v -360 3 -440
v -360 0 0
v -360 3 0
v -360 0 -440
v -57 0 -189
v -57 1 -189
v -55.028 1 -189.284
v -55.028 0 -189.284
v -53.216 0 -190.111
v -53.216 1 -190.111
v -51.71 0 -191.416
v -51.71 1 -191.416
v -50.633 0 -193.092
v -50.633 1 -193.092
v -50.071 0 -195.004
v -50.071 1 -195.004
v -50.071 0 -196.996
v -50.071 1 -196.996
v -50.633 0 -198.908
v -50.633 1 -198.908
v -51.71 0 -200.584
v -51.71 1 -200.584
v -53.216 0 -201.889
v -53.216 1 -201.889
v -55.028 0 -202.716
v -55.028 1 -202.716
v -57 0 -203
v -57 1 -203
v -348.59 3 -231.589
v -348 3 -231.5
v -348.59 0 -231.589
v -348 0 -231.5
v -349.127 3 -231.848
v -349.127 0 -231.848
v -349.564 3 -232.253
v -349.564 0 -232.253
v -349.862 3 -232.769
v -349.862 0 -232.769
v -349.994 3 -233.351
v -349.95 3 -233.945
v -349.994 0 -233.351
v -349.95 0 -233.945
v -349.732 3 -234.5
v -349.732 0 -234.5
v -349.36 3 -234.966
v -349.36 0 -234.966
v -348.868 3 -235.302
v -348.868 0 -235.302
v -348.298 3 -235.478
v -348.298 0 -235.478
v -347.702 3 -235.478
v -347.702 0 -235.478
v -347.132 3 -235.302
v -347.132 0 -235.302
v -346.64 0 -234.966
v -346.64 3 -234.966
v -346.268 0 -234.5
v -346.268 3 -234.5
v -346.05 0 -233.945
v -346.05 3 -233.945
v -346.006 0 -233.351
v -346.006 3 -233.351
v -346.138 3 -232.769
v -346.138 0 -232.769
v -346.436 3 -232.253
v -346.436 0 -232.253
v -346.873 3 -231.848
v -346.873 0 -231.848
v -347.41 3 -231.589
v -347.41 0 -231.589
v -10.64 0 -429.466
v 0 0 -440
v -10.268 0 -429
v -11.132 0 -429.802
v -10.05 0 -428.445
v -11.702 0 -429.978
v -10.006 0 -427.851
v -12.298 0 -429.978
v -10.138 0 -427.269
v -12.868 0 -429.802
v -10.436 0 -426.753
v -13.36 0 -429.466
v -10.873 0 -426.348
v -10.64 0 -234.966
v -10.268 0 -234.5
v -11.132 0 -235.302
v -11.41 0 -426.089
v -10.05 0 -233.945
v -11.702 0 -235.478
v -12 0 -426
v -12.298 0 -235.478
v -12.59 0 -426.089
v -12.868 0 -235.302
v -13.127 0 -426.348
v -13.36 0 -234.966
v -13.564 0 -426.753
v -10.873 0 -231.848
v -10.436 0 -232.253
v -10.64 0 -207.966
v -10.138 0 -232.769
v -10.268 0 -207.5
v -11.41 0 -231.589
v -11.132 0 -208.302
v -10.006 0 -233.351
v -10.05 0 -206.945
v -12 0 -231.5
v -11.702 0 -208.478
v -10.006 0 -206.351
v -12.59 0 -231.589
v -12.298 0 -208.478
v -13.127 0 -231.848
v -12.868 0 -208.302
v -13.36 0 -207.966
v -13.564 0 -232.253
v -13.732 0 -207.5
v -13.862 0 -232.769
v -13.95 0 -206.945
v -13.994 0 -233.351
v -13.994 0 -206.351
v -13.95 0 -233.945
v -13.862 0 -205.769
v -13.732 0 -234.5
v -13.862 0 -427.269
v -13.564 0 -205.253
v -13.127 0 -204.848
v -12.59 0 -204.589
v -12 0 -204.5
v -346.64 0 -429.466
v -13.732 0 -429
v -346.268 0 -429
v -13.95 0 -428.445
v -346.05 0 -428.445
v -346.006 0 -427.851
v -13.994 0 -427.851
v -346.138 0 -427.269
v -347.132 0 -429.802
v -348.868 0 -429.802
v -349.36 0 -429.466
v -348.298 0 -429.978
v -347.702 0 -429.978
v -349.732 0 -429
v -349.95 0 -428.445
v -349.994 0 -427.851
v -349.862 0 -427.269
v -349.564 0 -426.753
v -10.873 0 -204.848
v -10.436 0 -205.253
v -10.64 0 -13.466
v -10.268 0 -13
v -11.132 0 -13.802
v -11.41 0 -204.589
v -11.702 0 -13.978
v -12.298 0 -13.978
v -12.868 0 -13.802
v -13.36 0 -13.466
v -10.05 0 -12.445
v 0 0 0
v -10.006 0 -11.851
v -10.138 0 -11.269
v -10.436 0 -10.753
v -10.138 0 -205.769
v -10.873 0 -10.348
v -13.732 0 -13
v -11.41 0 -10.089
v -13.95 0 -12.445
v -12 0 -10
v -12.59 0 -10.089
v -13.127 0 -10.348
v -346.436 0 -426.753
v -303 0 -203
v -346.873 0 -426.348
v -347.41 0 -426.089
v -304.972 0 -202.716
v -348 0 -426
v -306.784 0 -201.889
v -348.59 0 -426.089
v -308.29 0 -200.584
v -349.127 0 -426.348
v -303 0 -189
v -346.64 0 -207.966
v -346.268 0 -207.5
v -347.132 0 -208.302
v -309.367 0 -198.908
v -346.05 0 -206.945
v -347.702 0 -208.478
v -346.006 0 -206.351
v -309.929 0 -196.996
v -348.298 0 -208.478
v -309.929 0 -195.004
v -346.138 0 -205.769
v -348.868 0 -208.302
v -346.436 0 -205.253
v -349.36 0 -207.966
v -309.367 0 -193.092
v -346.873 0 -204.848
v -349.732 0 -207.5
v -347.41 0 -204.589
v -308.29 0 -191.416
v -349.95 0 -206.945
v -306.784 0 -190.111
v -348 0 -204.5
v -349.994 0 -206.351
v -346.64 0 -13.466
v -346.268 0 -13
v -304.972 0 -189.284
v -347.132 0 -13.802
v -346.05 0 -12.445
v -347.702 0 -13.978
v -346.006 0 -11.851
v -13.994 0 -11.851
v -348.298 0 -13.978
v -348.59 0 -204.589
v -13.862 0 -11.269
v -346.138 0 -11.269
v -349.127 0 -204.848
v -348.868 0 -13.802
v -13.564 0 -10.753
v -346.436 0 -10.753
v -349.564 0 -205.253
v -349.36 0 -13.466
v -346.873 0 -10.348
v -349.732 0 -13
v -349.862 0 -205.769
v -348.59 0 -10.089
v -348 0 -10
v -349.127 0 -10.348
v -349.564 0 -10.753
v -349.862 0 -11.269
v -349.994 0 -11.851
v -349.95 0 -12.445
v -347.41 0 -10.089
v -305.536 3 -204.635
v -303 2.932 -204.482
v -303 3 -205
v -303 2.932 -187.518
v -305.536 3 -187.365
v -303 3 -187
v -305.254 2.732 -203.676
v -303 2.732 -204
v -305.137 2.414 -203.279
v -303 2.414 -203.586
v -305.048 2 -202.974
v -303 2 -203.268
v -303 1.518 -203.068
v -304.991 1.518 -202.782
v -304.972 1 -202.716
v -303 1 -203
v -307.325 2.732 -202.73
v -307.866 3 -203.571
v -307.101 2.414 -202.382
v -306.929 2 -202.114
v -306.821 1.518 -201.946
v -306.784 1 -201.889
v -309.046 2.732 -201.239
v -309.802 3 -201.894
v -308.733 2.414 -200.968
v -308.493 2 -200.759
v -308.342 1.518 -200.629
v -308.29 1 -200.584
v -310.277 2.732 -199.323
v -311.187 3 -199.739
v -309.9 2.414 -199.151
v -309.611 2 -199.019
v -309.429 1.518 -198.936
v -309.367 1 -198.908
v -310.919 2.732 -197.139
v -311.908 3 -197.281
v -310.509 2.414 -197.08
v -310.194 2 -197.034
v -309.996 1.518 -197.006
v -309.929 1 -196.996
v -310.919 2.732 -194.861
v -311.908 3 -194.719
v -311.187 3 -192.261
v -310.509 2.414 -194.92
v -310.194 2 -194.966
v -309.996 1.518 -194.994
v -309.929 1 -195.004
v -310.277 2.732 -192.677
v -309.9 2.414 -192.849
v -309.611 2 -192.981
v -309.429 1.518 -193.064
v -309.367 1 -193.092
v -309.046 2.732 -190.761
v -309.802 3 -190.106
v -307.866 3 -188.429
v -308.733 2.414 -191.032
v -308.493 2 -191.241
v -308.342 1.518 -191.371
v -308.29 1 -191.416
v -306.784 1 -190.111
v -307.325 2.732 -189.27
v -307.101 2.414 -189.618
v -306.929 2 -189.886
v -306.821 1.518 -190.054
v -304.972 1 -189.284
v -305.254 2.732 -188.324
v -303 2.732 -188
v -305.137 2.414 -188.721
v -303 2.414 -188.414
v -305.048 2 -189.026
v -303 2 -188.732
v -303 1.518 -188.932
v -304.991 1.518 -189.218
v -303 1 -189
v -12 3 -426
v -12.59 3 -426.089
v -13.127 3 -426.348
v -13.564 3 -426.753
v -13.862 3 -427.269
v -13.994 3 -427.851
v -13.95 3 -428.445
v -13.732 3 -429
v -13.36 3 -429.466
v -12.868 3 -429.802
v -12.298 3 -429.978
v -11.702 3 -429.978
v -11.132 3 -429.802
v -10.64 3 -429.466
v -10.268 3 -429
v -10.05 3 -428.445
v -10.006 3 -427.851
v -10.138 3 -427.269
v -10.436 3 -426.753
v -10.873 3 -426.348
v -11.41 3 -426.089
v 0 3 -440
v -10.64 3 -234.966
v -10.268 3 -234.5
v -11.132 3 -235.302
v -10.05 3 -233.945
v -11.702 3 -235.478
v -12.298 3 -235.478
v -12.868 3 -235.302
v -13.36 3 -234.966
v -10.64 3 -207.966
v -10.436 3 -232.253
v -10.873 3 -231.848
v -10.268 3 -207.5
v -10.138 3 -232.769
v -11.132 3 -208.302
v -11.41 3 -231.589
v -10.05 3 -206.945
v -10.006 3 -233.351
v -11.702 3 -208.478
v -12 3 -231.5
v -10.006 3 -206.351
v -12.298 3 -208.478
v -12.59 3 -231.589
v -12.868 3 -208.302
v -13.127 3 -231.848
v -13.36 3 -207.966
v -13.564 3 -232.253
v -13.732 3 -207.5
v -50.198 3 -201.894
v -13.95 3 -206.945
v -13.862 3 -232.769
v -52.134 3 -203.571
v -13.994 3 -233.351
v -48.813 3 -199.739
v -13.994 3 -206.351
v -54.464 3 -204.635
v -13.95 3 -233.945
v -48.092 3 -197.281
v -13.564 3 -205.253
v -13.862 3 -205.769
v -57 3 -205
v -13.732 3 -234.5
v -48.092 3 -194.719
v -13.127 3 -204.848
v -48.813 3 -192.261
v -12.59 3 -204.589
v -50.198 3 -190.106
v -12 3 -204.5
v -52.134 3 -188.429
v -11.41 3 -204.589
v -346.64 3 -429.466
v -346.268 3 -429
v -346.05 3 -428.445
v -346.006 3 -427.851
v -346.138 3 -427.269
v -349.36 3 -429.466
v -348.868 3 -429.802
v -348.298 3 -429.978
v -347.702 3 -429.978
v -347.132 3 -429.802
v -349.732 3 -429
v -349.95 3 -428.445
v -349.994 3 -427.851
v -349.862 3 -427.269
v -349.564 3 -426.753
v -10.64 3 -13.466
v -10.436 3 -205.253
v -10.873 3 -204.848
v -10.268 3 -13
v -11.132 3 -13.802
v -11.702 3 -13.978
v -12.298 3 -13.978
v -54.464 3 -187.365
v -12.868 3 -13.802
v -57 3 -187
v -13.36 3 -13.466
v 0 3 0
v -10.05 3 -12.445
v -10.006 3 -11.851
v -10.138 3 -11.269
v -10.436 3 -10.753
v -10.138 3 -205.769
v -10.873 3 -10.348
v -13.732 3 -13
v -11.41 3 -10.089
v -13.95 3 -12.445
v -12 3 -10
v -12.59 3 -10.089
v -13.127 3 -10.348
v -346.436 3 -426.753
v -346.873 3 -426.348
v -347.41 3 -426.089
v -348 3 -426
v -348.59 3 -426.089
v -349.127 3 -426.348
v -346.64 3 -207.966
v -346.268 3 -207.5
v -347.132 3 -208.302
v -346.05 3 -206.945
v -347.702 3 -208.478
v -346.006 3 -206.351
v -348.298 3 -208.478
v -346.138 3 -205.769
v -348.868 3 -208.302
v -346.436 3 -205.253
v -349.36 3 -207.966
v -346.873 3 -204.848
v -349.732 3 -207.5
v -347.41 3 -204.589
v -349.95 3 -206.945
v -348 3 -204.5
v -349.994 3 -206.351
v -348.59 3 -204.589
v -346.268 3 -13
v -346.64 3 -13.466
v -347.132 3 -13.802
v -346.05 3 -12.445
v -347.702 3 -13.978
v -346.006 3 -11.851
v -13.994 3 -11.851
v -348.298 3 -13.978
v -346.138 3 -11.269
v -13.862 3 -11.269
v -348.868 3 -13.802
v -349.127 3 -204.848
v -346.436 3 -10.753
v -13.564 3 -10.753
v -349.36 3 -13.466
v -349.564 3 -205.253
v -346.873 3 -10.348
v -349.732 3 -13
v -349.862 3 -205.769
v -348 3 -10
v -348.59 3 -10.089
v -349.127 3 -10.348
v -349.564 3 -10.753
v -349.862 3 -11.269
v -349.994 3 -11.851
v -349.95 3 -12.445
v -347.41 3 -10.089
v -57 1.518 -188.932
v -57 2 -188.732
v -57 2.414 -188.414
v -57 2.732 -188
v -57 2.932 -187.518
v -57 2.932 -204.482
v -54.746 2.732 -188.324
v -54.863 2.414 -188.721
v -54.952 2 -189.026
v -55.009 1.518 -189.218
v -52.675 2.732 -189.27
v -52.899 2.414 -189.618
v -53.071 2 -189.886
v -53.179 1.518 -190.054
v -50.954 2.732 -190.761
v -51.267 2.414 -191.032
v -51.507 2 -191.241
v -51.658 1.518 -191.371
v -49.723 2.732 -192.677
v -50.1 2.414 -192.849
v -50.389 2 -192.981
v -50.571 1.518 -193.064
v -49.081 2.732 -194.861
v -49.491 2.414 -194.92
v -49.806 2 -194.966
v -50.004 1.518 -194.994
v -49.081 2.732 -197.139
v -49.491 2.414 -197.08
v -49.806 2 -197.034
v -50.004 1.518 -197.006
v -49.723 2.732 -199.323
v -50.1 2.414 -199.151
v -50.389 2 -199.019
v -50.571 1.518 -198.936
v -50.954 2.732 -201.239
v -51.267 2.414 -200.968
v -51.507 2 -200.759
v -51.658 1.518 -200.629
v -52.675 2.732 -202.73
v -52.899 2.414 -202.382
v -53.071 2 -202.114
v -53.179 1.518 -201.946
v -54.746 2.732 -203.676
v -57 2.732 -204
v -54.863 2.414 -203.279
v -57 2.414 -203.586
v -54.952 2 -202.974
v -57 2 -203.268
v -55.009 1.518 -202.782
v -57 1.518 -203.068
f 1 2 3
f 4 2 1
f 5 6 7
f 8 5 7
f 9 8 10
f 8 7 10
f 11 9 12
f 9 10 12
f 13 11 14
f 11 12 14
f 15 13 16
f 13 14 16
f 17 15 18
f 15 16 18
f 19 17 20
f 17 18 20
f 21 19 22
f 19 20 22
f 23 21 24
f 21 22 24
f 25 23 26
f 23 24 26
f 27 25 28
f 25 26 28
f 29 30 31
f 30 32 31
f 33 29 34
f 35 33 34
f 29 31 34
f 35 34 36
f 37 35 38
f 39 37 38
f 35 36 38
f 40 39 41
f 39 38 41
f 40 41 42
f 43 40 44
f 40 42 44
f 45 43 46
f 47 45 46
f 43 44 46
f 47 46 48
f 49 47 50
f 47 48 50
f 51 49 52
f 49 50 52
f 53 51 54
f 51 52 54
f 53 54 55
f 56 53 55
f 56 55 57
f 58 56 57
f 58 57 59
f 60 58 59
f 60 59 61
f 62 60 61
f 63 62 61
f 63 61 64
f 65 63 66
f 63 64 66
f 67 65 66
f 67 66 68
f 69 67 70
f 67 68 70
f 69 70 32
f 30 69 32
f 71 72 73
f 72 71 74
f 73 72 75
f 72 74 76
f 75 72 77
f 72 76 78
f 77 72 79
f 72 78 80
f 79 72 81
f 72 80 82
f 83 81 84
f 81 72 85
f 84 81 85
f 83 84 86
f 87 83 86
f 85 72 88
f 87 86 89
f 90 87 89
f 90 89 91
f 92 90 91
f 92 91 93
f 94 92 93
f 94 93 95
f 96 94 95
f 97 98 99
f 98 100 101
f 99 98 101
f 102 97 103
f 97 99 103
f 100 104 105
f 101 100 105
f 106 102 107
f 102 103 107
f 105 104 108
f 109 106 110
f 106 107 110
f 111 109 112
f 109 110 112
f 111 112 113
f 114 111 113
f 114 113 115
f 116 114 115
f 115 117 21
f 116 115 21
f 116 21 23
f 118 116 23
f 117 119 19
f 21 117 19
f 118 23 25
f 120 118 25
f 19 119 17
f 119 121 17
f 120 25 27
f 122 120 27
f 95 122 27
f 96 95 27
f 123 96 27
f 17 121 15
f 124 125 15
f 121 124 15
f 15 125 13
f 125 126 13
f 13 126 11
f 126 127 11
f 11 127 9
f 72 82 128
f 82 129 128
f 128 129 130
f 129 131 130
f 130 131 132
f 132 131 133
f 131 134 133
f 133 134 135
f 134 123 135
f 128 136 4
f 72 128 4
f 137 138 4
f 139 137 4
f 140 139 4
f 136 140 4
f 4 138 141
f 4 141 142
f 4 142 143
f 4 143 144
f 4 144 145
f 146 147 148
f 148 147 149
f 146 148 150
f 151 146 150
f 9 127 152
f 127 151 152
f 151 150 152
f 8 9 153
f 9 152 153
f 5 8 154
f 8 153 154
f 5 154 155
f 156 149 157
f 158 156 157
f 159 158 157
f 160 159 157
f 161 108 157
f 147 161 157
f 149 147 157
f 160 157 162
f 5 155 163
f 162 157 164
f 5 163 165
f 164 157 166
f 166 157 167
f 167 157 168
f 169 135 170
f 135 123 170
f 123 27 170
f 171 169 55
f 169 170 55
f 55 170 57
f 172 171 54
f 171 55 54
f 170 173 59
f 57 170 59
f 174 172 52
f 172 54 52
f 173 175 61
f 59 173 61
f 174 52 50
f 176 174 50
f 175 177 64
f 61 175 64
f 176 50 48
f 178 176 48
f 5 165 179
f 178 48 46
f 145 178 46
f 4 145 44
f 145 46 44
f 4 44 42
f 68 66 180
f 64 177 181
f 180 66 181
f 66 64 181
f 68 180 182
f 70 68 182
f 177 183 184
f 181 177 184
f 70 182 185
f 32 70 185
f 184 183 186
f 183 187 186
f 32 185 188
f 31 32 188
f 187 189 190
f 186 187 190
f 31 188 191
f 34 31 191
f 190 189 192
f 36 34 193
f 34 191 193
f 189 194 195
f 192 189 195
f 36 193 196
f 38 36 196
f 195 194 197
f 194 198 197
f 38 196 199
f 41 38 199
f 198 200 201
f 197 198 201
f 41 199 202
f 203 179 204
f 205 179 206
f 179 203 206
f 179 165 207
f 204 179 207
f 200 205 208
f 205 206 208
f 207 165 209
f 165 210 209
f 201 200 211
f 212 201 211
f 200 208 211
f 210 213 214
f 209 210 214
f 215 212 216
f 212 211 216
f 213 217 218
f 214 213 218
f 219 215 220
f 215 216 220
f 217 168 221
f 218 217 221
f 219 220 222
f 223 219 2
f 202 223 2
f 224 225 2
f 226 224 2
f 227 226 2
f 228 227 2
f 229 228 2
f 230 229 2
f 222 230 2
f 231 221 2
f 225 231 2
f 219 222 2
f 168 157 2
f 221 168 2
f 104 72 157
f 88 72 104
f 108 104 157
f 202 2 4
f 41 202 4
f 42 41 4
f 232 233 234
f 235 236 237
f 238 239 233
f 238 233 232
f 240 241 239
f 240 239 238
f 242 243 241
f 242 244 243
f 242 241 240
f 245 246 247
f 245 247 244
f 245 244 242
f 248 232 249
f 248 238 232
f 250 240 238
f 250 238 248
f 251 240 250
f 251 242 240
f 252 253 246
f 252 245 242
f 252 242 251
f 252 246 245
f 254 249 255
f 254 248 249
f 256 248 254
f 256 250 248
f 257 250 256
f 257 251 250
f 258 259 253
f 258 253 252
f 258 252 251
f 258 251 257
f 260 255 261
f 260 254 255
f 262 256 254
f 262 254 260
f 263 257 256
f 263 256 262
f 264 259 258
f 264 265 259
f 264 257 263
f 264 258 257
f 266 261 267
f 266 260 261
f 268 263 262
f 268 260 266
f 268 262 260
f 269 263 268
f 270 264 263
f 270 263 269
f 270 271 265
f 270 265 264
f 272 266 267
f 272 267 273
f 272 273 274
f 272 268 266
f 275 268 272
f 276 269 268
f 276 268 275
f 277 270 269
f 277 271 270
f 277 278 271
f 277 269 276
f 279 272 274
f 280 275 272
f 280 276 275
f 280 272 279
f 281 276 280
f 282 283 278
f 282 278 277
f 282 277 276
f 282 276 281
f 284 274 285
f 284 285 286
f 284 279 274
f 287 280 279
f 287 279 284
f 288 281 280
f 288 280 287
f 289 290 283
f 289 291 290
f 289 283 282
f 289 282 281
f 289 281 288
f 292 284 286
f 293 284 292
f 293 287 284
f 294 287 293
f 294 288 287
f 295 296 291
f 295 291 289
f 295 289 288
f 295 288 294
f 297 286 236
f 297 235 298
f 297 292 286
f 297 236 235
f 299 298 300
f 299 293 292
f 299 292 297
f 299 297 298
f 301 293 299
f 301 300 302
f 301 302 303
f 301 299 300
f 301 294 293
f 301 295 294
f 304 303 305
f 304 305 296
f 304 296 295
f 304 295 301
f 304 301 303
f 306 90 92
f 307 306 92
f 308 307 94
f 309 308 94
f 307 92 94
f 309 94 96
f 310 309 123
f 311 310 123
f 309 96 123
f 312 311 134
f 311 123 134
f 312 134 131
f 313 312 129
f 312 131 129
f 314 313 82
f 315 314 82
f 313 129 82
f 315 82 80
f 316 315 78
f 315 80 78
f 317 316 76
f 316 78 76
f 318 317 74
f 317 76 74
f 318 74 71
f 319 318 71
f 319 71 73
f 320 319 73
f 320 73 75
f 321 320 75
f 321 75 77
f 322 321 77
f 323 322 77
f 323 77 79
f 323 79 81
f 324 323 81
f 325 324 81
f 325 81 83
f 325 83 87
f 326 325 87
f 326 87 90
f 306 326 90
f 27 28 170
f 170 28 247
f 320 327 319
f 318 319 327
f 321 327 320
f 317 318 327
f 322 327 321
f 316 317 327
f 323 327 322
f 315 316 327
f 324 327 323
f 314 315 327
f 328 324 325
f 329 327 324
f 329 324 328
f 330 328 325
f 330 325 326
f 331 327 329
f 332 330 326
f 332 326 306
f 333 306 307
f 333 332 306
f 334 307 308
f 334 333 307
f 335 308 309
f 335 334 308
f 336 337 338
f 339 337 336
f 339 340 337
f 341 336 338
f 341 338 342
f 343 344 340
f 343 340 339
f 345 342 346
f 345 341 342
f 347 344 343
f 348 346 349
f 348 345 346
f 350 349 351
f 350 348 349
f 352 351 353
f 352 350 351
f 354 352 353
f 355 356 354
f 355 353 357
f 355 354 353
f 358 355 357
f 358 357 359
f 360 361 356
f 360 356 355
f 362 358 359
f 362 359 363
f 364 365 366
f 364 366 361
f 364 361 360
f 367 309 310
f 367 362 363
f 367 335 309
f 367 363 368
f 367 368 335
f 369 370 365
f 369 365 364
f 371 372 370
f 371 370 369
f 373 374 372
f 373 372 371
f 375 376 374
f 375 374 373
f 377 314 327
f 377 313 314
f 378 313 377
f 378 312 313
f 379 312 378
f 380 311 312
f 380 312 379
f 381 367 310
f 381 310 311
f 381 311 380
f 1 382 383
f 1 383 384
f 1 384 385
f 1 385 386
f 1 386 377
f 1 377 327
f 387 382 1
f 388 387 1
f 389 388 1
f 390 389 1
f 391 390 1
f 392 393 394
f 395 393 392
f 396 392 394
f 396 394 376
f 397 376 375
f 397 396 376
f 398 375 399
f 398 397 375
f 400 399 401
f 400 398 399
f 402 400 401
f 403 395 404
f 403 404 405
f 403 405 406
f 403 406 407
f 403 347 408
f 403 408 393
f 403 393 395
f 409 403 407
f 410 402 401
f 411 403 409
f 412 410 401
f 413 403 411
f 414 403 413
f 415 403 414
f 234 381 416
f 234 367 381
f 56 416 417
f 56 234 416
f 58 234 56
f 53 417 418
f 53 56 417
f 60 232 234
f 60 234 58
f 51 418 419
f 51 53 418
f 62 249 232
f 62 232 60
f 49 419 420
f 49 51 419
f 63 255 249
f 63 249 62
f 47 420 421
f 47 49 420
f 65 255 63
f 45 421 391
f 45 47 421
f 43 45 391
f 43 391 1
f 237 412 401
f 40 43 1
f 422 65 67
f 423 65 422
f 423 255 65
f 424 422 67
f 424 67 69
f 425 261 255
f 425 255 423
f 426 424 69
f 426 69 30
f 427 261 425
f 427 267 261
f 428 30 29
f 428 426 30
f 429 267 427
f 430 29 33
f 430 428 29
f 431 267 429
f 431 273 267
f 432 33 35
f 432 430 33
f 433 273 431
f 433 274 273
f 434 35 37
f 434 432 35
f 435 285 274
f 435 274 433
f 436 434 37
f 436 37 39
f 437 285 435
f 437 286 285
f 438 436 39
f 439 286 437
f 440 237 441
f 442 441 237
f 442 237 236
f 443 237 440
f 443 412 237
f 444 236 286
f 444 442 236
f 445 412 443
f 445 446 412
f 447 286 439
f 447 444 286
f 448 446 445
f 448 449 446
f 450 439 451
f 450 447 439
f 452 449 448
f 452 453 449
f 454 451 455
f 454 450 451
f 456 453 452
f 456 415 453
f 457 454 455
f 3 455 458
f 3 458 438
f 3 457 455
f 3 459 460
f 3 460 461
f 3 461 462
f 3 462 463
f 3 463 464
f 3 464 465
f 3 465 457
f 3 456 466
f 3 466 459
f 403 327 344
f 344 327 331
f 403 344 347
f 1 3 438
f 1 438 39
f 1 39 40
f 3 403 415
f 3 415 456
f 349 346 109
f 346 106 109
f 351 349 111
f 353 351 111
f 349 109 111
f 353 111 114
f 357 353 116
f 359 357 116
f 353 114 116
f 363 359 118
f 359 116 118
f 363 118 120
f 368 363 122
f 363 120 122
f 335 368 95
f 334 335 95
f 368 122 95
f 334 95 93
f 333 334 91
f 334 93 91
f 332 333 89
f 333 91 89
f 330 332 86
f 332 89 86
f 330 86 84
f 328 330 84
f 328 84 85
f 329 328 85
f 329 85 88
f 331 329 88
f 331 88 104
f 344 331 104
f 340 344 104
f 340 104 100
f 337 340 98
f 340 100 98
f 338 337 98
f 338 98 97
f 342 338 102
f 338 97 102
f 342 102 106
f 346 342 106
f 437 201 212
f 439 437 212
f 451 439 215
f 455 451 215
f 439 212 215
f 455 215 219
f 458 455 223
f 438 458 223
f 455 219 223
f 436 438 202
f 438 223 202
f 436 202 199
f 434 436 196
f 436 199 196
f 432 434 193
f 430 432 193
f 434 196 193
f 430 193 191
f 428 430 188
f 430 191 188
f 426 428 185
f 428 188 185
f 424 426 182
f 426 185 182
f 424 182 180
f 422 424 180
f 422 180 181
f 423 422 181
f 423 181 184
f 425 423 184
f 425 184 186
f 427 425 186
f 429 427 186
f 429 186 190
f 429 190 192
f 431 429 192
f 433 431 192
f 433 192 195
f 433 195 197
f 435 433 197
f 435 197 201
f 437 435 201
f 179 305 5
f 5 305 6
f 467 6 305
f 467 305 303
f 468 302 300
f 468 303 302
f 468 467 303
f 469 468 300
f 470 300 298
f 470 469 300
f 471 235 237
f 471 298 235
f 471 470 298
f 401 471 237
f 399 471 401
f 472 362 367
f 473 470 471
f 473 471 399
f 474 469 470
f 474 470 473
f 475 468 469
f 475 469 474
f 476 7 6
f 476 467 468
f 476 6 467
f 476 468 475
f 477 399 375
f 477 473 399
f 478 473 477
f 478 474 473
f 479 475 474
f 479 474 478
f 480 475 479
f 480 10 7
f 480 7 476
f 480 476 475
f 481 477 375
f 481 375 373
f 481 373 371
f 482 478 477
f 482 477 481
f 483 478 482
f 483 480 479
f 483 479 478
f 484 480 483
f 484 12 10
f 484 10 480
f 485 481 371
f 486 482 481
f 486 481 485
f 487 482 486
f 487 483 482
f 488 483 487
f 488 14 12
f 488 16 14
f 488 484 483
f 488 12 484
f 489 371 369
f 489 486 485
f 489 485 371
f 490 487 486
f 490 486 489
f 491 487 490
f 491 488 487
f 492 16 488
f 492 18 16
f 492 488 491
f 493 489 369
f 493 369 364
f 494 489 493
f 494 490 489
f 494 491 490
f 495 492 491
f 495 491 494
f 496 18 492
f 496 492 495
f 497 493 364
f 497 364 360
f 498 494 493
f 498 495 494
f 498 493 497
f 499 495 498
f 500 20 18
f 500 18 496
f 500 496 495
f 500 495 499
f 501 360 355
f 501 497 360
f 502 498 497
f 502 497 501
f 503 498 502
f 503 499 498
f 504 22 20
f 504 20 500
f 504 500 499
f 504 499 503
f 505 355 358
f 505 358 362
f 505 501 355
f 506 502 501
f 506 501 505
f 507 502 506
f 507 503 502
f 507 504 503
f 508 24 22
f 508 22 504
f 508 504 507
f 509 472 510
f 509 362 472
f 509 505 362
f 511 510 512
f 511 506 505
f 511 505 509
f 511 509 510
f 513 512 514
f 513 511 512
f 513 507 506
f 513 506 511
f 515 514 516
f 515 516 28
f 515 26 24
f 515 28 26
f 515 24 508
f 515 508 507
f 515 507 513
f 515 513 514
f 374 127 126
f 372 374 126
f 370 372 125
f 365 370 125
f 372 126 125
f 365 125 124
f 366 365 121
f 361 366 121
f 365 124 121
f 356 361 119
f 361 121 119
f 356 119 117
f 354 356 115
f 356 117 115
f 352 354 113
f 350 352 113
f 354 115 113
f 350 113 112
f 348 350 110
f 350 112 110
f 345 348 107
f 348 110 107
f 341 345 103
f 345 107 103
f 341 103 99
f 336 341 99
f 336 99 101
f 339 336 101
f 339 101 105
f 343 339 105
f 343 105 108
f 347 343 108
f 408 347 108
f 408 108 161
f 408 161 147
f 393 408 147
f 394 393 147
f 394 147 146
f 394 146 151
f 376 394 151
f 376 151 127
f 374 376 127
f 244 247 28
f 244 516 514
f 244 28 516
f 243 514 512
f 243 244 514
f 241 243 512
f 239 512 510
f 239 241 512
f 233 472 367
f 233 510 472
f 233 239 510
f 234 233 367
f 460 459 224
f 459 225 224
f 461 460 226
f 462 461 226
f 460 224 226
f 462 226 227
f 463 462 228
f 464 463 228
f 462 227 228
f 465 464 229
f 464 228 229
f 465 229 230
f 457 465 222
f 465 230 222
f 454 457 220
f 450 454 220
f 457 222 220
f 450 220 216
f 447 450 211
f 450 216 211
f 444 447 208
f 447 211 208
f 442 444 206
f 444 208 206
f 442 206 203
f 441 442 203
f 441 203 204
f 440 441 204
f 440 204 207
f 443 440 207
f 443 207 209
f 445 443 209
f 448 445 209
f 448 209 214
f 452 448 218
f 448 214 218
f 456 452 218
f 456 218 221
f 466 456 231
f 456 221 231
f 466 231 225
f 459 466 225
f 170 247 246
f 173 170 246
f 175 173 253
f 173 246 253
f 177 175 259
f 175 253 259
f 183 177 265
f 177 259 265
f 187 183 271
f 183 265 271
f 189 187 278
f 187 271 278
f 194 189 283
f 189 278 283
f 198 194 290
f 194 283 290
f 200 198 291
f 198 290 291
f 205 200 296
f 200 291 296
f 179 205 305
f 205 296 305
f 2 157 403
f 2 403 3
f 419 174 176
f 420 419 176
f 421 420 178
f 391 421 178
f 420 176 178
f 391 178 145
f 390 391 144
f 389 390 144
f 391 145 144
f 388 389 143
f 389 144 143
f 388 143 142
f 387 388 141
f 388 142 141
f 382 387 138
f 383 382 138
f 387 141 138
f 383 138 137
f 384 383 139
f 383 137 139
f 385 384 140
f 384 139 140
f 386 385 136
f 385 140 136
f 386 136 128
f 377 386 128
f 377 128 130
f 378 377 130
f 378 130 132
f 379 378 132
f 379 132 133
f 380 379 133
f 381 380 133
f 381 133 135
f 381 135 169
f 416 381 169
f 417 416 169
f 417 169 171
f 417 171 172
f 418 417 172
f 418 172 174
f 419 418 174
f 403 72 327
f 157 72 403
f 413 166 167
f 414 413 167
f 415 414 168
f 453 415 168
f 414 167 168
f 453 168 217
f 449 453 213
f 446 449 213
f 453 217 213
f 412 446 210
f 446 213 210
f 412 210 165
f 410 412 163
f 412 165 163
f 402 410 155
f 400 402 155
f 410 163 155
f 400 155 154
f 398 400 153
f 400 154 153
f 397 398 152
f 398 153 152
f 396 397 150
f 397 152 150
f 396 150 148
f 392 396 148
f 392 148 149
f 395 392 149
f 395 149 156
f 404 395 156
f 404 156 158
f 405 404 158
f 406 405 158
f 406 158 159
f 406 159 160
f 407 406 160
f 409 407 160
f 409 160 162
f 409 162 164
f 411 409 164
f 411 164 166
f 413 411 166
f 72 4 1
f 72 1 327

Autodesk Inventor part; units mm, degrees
ref_plane "YZ Plane" through (0, 0, 0) normal (1, 0, 0) x (0, 1, 0)
ref_plane "XZ Plane" through (0, 0, 0) normal (0, 1, 0) x (-1, 0, 0)
ref_plane "XY Plane" through (0, 0, 0) normal (0, 0, 1) x (1, 0, 0)
sketch "Sketch1" plane through (0, 0, 0) normal (0, 1, 0) x (-1, 0, 0)
  line L0 (0, 0) -> (360, 0)
  line L1 (360, 0) -> (360, -440)
  line L2 (360, -440) -> (0, -440)
  line L3 (0, -440) -> (0, 0)
  dimension "d0" = 360
  dimension "d1" = 440
extrude "Extrusion1" add sketch "Sketch1" along normal blind 3
hole "Hole1" at (-12, 3, -12) direction (0, -1, 0) diameter 4 end through all
hole "Hole2" at (-348, 3, -12) direction (0, -1, 0) diameter 4 end through all
hole "Hole3" at (-348, 3, -428) direction (0, -1, 0) diameter 4 end through all
hole "Hole4" at (-12, 3, -428) direction (0, -1, 0) diameter 4 end through all
hole "Hole5" at (-12, 3, -206.5) direction (0, -1, 0) diameter 4 end through all
hole "Hole6" at (-12, 3, -233.5) direction (0, -1, 0) diameter 4 end through all
hole "Hole7" at (-348, 3, -206.5) direction (0, -1, 0) diameter 4 end through all
hole "Hole8" at (-348, 3, -233.5) direction (0, -1, 0) diameter 4 end through all
sketch "Sketch2" plane through (0, 3, 0) normal (0, 1, 0) x (1, 0, 0)
  line L0 (-360, 440) -> (-360, 0) projected
  line L1 (-360, 220) -> (0, 220)
  line L2 (0, 440) -> (0, 0) projected
  line L3 (-310, 196) -> (-50, 196) construction
  line L4 (-303, 189) -> (-57, 189)
  line L5 (-57, 203) -> (-303, 203)
  arc A0 (-303, 203) -> (-303, 189) centre (-303, 196) ccw
  arc A1 (-57, 189) -> (-57, 203) centre (-57, 196) ccw
  point P0 (-180, 196)
extrude "Extrusion2" cut sketch "Sketch2" against normal blind 3
fillet "Fillet1" radius 2 4 edges at (-50, 3, -196) (-180, 3, -189) (-310, 3, -196) (-180, 3, -203)
properties part number "FrameTop" material "Dibond"
